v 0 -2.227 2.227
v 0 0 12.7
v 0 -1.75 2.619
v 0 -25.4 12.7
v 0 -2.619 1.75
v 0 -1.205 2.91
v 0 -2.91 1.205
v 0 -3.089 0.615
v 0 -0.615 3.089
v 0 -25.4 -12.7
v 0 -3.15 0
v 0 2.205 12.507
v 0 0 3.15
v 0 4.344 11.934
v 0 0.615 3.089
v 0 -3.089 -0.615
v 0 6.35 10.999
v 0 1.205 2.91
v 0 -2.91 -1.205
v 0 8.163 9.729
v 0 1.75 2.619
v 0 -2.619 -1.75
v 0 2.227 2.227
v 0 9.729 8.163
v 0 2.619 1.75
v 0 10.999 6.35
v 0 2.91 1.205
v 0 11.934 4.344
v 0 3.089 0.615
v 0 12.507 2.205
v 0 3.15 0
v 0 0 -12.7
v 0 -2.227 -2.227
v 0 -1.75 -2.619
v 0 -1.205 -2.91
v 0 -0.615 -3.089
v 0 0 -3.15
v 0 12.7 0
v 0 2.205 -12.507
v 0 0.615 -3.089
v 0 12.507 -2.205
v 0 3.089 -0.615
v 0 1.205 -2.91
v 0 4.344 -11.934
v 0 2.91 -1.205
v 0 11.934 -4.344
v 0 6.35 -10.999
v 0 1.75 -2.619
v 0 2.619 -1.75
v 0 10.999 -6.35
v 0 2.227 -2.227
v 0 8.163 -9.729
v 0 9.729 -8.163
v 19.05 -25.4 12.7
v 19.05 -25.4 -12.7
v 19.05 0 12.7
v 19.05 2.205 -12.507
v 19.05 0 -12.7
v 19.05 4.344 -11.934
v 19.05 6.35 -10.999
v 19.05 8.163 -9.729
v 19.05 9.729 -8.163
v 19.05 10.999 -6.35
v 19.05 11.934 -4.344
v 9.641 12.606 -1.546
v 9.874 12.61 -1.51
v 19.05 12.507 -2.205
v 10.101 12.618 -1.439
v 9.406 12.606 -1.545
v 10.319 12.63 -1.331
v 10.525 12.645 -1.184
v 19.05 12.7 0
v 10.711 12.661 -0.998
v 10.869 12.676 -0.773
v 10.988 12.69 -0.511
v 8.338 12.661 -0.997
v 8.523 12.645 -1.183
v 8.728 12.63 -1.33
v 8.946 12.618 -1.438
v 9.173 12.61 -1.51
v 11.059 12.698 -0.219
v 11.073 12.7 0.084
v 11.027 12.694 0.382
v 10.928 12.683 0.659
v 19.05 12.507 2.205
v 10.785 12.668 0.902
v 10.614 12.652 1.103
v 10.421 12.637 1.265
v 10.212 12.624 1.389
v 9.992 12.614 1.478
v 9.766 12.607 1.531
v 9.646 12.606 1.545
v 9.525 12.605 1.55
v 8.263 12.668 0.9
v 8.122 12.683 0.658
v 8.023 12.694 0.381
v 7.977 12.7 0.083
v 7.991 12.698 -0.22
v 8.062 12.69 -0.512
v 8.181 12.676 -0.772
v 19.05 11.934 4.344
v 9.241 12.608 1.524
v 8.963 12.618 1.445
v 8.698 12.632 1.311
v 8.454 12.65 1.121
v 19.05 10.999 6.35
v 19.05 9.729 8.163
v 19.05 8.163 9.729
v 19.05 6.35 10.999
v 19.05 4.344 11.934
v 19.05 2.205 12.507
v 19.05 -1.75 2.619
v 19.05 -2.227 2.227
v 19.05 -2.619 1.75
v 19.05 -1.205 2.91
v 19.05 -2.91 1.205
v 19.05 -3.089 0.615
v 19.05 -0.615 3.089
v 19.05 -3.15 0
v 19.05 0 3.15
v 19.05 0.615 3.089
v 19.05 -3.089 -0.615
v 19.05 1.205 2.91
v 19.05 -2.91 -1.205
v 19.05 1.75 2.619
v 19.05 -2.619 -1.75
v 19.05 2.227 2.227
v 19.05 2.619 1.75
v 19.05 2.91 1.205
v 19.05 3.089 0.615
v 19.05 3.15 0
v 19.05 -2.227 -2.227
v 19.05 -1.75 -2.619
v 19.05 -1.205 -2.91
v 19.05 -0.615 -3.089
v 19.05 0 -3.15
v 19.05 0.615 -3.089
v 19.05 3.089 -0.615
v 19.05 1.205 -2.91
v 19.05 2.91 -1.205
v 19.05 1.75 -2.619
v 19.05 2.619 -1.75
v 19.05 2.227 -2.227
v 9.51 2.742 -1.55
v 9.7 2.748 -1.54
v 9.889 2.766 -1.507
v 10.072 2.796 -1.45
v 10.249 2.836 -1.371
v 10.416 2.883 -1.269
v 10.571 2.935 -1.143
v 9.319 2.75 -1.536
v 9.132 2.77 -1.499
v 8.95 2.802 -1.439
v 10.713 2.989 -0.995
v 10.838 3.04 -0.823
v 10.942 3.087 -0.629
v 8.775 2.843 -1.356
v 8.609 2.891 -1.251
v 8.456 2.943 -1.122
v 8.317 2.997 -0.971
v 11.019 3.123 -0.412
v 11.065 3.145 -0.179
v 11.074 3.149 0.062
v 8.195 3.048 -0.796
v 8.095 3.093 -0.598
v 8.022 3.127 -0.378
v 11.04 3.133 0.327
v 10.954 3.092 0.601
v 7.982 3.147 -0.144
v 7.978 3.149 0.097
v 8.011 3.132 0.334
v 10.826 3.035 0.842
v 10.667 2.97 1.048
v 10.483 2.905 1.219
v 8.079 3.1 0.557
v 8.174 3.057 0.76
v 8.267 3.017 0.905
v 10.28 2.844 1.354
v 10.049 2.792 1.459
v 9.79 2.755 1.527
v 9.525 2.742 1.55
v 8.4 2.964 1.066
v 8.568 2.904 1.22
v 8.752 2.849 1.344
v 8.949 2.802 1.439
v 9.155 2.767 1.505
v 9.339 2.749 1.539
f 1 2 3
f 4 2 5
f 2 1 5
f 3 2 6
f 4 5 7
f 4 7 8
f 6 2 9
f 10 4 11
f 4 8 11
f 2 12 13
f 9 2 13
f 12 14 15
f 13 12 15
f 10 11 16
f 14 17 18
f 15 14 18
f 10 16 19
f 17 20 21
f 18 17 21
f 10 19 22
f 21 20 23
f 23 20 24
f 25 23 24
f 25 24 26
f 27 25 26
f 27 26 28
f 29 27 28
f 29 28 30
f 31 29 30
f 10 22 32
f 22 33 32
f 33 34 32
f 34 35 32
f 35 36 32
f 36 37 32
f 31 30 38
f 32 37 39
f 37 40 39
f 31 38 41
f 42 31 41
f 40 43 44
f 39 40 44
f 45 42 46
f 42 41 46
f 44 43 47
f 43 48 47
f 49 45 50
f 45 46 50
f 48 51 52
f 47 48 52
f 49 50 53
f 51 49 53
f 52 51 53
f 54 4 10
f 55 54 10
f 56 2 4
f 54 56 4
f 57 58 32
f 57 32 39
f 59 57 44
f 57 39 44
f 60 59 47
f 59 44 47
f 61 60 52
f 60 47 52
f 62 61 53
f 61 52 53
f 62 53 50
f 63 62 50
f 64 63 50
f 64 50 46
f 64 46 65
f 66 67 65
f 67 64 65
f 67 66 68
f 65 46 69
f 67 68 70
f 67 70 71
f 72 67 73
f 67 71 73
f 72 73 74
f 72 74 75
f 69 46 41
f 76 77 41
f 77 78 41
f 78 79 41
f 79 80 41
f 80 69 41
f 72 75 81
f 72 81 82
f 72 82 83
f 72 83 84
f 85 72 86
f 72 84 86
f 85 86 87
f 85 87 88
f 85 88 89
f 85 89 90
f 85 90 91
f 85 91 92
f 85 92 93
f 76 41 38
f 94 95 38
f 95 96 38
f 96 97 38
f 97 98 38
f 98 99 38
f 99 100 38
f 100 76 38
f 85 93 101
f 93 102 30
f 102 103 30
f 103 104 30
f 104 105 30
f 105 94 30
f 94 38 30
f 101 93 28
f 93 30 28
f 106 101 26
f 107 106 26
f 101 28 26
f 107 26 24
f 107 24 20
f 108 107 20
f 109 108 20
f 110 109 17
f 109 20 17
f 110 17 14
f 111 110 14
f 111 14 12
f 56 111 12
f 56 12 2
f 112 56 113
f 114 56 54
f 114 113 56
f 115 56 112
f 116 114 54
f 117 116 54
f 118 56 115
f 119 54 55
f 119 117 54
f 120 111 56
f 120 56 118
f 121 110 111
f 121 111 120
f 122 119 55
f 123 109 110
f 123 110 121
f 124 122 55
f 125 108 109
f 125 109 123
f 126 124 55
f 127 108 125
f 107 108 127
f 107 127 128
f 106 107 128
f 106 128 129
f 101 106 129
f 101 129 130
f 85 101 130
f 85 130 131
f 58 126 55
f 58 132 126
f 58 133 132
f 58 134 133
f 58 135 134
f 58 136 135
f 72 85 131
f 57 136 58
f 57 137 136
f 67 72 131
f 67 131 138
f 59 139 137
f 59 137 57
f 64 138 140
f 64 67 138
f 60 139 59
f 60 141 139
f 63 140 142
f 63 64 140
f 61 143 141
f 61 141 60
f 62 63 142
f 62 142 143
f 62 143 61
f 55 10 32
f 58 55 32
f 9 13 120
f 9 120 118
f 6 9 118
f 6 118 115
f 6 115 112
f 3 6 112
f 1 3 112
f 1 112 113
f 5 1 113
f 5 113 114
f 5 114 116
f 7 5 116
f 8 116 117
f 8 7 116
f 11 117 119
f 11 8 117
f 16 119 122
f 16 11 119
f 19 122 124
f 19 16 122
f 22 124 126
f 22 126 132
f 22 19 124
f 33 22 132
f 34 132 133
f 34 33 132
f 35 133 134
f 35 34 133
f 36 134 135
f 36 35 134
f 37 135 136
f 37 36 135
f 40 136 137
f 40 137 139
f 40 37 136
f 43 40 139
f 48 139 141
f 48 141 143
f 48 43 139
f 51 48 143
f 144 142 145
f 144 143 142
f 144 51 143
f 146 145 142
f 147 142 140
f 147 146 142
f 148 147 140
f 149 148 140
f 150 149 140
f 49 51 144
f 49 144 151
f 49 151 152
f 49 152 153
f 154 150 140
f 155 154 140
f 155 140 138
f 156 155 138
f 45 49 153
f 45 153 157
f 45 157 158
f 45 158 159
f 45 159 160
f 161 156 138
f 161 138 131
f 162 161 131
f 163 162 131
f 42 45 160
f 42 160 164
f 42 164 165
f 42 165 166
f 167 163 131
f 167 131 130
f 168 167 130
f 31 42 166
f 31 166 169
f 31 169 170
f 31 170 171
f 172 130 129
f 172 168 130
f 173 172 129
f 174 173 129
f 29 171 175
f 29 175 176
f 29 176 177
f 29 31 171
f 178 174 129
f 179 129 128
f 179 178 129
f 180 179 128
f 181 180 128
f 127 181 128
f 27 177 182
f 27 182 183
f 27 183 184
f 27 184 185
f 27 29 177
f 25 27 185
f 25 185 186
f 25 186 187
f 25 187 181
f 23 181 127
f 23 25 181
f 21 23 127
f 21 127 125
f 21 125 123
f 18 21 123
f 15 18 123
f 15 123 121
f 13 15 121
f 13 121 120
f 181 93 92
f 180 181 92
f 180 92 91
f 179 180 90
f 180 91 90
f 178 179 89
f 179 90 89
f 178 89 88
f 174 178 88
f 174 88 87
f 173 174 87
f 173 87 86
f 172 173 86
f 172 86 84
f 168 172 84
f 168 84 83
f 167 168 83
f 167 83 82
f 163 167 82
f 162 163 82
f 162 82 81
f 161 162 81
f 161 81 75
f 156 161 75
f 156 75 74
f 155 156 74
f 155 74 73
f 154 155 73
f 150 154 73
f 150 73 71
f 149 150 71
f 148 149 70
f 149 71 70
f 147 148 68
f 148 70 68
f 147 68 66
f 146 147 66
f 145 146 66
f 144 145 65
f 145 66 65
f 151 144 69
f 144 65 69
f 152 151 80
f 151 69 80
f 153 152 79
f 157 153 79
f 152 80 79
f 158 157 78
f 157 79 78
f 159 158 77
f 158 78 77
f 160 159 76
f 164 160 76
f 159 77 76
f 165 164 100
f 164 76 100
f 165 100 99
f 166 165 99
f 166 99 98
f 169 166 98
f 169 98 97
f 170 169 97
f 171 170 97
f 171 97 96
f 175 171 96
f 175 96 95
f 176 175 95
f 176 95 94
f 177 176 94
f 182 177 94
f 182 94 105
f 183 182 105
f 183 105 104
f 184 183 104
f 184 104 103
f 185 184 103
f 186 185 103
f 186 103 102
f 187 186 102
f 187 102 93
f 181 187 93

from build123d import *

# Parameters (mm, degrees)
SKETCH1_R               = 12.7
SKETCH1_R_2             = 3.15
BOSS_EXTRUDE1_DEPTH     = 19.05
BOSS_EXTRUDE2_START     = -19.05
BOSS_EXTRUDE2_DEPTH     = 19.05
CUT_EXTRUDE1_REACH      = 46.45
CUT_EXTRUDE1_END_RADIUS = 3.15
SKETCH3_R               = 1.55


with BuildPart() as part:
    # Sketch1 → Boss-Extrude1 (new body)
    with BuildSketch(Plane(origin=(0, 0, 0), x_dir=(0, 0, -1), z_dir=(1, 0, 0))):
        with Locations(Location((0, 0, 0), (0, 0, 180))):
            Circle(SKETCH1_R)
        with Locations(Location((0, 0, 0), (0, 0, 180))):
            Circle(SKETCH1_R_2, mode=Mode.SUBTRACT)
    extrude(amount=BOSS_EXTRUDE1_DEPTH)

    # Sketch2 → Boss-Extrude2 (add)
    with BuildSketch(Plane(origin=(19.05, 0, 0), x_dir=(0, 0, -1), z_dir=(1, 0, 0)).offset(BOSS_EXTRUDE2_START)):
        with BuildLine():
            Line((12.7, -25.4), (12.7, 0))
            ThreePointArc((12.7, 0), (0, -12.7), (-12.7, 0))
            Line((-12.7, 0), (-12.7, -25.4))
            Line((-12.7, -25.4), (12.7, -25.4))
        make_face()
    extrude(amount=BOSS_EXTRUDE2_DEPTH)

    # Cut-Extrude1: up to this cylinder (the profile starts outside it)
    cut_extrude1_end = Plane(origin=(9.525, 0, 0), z_dir=(-1, 0, 0)) * Cylinder(CUT_EXTRUDE1_END_RADIUS, 100.2, mode=Mode.PRIVATE)
    # Sketch3 → Cut-Extrude1 (cut, up to the surface)
    with BuildSketch(Plane(origin=(0, 12.7, 0), x_dir=(1, 0, 0), z_dir=(0, 1, 0)), mode=Mode.PRIVATE) as cut_extrude1_sk1:
        with Locations(Location((9.525, 0, 0), (0, 0, 270))):
            Circle(SKETCH3_R)
    cut_extrude1_tool1 = extrude(cut_extrude1_sk1.sketch, amount=-CUT_EXTRUDE1_REACH, mode=Mode.PRIVATE) - cut_extrude1_end
    add(cut_extrude1_tool1.solids().sort_by_distance((9.525, 12.7, 0))[0], mode=Mode.SUBTRACT)


solid = part.part
